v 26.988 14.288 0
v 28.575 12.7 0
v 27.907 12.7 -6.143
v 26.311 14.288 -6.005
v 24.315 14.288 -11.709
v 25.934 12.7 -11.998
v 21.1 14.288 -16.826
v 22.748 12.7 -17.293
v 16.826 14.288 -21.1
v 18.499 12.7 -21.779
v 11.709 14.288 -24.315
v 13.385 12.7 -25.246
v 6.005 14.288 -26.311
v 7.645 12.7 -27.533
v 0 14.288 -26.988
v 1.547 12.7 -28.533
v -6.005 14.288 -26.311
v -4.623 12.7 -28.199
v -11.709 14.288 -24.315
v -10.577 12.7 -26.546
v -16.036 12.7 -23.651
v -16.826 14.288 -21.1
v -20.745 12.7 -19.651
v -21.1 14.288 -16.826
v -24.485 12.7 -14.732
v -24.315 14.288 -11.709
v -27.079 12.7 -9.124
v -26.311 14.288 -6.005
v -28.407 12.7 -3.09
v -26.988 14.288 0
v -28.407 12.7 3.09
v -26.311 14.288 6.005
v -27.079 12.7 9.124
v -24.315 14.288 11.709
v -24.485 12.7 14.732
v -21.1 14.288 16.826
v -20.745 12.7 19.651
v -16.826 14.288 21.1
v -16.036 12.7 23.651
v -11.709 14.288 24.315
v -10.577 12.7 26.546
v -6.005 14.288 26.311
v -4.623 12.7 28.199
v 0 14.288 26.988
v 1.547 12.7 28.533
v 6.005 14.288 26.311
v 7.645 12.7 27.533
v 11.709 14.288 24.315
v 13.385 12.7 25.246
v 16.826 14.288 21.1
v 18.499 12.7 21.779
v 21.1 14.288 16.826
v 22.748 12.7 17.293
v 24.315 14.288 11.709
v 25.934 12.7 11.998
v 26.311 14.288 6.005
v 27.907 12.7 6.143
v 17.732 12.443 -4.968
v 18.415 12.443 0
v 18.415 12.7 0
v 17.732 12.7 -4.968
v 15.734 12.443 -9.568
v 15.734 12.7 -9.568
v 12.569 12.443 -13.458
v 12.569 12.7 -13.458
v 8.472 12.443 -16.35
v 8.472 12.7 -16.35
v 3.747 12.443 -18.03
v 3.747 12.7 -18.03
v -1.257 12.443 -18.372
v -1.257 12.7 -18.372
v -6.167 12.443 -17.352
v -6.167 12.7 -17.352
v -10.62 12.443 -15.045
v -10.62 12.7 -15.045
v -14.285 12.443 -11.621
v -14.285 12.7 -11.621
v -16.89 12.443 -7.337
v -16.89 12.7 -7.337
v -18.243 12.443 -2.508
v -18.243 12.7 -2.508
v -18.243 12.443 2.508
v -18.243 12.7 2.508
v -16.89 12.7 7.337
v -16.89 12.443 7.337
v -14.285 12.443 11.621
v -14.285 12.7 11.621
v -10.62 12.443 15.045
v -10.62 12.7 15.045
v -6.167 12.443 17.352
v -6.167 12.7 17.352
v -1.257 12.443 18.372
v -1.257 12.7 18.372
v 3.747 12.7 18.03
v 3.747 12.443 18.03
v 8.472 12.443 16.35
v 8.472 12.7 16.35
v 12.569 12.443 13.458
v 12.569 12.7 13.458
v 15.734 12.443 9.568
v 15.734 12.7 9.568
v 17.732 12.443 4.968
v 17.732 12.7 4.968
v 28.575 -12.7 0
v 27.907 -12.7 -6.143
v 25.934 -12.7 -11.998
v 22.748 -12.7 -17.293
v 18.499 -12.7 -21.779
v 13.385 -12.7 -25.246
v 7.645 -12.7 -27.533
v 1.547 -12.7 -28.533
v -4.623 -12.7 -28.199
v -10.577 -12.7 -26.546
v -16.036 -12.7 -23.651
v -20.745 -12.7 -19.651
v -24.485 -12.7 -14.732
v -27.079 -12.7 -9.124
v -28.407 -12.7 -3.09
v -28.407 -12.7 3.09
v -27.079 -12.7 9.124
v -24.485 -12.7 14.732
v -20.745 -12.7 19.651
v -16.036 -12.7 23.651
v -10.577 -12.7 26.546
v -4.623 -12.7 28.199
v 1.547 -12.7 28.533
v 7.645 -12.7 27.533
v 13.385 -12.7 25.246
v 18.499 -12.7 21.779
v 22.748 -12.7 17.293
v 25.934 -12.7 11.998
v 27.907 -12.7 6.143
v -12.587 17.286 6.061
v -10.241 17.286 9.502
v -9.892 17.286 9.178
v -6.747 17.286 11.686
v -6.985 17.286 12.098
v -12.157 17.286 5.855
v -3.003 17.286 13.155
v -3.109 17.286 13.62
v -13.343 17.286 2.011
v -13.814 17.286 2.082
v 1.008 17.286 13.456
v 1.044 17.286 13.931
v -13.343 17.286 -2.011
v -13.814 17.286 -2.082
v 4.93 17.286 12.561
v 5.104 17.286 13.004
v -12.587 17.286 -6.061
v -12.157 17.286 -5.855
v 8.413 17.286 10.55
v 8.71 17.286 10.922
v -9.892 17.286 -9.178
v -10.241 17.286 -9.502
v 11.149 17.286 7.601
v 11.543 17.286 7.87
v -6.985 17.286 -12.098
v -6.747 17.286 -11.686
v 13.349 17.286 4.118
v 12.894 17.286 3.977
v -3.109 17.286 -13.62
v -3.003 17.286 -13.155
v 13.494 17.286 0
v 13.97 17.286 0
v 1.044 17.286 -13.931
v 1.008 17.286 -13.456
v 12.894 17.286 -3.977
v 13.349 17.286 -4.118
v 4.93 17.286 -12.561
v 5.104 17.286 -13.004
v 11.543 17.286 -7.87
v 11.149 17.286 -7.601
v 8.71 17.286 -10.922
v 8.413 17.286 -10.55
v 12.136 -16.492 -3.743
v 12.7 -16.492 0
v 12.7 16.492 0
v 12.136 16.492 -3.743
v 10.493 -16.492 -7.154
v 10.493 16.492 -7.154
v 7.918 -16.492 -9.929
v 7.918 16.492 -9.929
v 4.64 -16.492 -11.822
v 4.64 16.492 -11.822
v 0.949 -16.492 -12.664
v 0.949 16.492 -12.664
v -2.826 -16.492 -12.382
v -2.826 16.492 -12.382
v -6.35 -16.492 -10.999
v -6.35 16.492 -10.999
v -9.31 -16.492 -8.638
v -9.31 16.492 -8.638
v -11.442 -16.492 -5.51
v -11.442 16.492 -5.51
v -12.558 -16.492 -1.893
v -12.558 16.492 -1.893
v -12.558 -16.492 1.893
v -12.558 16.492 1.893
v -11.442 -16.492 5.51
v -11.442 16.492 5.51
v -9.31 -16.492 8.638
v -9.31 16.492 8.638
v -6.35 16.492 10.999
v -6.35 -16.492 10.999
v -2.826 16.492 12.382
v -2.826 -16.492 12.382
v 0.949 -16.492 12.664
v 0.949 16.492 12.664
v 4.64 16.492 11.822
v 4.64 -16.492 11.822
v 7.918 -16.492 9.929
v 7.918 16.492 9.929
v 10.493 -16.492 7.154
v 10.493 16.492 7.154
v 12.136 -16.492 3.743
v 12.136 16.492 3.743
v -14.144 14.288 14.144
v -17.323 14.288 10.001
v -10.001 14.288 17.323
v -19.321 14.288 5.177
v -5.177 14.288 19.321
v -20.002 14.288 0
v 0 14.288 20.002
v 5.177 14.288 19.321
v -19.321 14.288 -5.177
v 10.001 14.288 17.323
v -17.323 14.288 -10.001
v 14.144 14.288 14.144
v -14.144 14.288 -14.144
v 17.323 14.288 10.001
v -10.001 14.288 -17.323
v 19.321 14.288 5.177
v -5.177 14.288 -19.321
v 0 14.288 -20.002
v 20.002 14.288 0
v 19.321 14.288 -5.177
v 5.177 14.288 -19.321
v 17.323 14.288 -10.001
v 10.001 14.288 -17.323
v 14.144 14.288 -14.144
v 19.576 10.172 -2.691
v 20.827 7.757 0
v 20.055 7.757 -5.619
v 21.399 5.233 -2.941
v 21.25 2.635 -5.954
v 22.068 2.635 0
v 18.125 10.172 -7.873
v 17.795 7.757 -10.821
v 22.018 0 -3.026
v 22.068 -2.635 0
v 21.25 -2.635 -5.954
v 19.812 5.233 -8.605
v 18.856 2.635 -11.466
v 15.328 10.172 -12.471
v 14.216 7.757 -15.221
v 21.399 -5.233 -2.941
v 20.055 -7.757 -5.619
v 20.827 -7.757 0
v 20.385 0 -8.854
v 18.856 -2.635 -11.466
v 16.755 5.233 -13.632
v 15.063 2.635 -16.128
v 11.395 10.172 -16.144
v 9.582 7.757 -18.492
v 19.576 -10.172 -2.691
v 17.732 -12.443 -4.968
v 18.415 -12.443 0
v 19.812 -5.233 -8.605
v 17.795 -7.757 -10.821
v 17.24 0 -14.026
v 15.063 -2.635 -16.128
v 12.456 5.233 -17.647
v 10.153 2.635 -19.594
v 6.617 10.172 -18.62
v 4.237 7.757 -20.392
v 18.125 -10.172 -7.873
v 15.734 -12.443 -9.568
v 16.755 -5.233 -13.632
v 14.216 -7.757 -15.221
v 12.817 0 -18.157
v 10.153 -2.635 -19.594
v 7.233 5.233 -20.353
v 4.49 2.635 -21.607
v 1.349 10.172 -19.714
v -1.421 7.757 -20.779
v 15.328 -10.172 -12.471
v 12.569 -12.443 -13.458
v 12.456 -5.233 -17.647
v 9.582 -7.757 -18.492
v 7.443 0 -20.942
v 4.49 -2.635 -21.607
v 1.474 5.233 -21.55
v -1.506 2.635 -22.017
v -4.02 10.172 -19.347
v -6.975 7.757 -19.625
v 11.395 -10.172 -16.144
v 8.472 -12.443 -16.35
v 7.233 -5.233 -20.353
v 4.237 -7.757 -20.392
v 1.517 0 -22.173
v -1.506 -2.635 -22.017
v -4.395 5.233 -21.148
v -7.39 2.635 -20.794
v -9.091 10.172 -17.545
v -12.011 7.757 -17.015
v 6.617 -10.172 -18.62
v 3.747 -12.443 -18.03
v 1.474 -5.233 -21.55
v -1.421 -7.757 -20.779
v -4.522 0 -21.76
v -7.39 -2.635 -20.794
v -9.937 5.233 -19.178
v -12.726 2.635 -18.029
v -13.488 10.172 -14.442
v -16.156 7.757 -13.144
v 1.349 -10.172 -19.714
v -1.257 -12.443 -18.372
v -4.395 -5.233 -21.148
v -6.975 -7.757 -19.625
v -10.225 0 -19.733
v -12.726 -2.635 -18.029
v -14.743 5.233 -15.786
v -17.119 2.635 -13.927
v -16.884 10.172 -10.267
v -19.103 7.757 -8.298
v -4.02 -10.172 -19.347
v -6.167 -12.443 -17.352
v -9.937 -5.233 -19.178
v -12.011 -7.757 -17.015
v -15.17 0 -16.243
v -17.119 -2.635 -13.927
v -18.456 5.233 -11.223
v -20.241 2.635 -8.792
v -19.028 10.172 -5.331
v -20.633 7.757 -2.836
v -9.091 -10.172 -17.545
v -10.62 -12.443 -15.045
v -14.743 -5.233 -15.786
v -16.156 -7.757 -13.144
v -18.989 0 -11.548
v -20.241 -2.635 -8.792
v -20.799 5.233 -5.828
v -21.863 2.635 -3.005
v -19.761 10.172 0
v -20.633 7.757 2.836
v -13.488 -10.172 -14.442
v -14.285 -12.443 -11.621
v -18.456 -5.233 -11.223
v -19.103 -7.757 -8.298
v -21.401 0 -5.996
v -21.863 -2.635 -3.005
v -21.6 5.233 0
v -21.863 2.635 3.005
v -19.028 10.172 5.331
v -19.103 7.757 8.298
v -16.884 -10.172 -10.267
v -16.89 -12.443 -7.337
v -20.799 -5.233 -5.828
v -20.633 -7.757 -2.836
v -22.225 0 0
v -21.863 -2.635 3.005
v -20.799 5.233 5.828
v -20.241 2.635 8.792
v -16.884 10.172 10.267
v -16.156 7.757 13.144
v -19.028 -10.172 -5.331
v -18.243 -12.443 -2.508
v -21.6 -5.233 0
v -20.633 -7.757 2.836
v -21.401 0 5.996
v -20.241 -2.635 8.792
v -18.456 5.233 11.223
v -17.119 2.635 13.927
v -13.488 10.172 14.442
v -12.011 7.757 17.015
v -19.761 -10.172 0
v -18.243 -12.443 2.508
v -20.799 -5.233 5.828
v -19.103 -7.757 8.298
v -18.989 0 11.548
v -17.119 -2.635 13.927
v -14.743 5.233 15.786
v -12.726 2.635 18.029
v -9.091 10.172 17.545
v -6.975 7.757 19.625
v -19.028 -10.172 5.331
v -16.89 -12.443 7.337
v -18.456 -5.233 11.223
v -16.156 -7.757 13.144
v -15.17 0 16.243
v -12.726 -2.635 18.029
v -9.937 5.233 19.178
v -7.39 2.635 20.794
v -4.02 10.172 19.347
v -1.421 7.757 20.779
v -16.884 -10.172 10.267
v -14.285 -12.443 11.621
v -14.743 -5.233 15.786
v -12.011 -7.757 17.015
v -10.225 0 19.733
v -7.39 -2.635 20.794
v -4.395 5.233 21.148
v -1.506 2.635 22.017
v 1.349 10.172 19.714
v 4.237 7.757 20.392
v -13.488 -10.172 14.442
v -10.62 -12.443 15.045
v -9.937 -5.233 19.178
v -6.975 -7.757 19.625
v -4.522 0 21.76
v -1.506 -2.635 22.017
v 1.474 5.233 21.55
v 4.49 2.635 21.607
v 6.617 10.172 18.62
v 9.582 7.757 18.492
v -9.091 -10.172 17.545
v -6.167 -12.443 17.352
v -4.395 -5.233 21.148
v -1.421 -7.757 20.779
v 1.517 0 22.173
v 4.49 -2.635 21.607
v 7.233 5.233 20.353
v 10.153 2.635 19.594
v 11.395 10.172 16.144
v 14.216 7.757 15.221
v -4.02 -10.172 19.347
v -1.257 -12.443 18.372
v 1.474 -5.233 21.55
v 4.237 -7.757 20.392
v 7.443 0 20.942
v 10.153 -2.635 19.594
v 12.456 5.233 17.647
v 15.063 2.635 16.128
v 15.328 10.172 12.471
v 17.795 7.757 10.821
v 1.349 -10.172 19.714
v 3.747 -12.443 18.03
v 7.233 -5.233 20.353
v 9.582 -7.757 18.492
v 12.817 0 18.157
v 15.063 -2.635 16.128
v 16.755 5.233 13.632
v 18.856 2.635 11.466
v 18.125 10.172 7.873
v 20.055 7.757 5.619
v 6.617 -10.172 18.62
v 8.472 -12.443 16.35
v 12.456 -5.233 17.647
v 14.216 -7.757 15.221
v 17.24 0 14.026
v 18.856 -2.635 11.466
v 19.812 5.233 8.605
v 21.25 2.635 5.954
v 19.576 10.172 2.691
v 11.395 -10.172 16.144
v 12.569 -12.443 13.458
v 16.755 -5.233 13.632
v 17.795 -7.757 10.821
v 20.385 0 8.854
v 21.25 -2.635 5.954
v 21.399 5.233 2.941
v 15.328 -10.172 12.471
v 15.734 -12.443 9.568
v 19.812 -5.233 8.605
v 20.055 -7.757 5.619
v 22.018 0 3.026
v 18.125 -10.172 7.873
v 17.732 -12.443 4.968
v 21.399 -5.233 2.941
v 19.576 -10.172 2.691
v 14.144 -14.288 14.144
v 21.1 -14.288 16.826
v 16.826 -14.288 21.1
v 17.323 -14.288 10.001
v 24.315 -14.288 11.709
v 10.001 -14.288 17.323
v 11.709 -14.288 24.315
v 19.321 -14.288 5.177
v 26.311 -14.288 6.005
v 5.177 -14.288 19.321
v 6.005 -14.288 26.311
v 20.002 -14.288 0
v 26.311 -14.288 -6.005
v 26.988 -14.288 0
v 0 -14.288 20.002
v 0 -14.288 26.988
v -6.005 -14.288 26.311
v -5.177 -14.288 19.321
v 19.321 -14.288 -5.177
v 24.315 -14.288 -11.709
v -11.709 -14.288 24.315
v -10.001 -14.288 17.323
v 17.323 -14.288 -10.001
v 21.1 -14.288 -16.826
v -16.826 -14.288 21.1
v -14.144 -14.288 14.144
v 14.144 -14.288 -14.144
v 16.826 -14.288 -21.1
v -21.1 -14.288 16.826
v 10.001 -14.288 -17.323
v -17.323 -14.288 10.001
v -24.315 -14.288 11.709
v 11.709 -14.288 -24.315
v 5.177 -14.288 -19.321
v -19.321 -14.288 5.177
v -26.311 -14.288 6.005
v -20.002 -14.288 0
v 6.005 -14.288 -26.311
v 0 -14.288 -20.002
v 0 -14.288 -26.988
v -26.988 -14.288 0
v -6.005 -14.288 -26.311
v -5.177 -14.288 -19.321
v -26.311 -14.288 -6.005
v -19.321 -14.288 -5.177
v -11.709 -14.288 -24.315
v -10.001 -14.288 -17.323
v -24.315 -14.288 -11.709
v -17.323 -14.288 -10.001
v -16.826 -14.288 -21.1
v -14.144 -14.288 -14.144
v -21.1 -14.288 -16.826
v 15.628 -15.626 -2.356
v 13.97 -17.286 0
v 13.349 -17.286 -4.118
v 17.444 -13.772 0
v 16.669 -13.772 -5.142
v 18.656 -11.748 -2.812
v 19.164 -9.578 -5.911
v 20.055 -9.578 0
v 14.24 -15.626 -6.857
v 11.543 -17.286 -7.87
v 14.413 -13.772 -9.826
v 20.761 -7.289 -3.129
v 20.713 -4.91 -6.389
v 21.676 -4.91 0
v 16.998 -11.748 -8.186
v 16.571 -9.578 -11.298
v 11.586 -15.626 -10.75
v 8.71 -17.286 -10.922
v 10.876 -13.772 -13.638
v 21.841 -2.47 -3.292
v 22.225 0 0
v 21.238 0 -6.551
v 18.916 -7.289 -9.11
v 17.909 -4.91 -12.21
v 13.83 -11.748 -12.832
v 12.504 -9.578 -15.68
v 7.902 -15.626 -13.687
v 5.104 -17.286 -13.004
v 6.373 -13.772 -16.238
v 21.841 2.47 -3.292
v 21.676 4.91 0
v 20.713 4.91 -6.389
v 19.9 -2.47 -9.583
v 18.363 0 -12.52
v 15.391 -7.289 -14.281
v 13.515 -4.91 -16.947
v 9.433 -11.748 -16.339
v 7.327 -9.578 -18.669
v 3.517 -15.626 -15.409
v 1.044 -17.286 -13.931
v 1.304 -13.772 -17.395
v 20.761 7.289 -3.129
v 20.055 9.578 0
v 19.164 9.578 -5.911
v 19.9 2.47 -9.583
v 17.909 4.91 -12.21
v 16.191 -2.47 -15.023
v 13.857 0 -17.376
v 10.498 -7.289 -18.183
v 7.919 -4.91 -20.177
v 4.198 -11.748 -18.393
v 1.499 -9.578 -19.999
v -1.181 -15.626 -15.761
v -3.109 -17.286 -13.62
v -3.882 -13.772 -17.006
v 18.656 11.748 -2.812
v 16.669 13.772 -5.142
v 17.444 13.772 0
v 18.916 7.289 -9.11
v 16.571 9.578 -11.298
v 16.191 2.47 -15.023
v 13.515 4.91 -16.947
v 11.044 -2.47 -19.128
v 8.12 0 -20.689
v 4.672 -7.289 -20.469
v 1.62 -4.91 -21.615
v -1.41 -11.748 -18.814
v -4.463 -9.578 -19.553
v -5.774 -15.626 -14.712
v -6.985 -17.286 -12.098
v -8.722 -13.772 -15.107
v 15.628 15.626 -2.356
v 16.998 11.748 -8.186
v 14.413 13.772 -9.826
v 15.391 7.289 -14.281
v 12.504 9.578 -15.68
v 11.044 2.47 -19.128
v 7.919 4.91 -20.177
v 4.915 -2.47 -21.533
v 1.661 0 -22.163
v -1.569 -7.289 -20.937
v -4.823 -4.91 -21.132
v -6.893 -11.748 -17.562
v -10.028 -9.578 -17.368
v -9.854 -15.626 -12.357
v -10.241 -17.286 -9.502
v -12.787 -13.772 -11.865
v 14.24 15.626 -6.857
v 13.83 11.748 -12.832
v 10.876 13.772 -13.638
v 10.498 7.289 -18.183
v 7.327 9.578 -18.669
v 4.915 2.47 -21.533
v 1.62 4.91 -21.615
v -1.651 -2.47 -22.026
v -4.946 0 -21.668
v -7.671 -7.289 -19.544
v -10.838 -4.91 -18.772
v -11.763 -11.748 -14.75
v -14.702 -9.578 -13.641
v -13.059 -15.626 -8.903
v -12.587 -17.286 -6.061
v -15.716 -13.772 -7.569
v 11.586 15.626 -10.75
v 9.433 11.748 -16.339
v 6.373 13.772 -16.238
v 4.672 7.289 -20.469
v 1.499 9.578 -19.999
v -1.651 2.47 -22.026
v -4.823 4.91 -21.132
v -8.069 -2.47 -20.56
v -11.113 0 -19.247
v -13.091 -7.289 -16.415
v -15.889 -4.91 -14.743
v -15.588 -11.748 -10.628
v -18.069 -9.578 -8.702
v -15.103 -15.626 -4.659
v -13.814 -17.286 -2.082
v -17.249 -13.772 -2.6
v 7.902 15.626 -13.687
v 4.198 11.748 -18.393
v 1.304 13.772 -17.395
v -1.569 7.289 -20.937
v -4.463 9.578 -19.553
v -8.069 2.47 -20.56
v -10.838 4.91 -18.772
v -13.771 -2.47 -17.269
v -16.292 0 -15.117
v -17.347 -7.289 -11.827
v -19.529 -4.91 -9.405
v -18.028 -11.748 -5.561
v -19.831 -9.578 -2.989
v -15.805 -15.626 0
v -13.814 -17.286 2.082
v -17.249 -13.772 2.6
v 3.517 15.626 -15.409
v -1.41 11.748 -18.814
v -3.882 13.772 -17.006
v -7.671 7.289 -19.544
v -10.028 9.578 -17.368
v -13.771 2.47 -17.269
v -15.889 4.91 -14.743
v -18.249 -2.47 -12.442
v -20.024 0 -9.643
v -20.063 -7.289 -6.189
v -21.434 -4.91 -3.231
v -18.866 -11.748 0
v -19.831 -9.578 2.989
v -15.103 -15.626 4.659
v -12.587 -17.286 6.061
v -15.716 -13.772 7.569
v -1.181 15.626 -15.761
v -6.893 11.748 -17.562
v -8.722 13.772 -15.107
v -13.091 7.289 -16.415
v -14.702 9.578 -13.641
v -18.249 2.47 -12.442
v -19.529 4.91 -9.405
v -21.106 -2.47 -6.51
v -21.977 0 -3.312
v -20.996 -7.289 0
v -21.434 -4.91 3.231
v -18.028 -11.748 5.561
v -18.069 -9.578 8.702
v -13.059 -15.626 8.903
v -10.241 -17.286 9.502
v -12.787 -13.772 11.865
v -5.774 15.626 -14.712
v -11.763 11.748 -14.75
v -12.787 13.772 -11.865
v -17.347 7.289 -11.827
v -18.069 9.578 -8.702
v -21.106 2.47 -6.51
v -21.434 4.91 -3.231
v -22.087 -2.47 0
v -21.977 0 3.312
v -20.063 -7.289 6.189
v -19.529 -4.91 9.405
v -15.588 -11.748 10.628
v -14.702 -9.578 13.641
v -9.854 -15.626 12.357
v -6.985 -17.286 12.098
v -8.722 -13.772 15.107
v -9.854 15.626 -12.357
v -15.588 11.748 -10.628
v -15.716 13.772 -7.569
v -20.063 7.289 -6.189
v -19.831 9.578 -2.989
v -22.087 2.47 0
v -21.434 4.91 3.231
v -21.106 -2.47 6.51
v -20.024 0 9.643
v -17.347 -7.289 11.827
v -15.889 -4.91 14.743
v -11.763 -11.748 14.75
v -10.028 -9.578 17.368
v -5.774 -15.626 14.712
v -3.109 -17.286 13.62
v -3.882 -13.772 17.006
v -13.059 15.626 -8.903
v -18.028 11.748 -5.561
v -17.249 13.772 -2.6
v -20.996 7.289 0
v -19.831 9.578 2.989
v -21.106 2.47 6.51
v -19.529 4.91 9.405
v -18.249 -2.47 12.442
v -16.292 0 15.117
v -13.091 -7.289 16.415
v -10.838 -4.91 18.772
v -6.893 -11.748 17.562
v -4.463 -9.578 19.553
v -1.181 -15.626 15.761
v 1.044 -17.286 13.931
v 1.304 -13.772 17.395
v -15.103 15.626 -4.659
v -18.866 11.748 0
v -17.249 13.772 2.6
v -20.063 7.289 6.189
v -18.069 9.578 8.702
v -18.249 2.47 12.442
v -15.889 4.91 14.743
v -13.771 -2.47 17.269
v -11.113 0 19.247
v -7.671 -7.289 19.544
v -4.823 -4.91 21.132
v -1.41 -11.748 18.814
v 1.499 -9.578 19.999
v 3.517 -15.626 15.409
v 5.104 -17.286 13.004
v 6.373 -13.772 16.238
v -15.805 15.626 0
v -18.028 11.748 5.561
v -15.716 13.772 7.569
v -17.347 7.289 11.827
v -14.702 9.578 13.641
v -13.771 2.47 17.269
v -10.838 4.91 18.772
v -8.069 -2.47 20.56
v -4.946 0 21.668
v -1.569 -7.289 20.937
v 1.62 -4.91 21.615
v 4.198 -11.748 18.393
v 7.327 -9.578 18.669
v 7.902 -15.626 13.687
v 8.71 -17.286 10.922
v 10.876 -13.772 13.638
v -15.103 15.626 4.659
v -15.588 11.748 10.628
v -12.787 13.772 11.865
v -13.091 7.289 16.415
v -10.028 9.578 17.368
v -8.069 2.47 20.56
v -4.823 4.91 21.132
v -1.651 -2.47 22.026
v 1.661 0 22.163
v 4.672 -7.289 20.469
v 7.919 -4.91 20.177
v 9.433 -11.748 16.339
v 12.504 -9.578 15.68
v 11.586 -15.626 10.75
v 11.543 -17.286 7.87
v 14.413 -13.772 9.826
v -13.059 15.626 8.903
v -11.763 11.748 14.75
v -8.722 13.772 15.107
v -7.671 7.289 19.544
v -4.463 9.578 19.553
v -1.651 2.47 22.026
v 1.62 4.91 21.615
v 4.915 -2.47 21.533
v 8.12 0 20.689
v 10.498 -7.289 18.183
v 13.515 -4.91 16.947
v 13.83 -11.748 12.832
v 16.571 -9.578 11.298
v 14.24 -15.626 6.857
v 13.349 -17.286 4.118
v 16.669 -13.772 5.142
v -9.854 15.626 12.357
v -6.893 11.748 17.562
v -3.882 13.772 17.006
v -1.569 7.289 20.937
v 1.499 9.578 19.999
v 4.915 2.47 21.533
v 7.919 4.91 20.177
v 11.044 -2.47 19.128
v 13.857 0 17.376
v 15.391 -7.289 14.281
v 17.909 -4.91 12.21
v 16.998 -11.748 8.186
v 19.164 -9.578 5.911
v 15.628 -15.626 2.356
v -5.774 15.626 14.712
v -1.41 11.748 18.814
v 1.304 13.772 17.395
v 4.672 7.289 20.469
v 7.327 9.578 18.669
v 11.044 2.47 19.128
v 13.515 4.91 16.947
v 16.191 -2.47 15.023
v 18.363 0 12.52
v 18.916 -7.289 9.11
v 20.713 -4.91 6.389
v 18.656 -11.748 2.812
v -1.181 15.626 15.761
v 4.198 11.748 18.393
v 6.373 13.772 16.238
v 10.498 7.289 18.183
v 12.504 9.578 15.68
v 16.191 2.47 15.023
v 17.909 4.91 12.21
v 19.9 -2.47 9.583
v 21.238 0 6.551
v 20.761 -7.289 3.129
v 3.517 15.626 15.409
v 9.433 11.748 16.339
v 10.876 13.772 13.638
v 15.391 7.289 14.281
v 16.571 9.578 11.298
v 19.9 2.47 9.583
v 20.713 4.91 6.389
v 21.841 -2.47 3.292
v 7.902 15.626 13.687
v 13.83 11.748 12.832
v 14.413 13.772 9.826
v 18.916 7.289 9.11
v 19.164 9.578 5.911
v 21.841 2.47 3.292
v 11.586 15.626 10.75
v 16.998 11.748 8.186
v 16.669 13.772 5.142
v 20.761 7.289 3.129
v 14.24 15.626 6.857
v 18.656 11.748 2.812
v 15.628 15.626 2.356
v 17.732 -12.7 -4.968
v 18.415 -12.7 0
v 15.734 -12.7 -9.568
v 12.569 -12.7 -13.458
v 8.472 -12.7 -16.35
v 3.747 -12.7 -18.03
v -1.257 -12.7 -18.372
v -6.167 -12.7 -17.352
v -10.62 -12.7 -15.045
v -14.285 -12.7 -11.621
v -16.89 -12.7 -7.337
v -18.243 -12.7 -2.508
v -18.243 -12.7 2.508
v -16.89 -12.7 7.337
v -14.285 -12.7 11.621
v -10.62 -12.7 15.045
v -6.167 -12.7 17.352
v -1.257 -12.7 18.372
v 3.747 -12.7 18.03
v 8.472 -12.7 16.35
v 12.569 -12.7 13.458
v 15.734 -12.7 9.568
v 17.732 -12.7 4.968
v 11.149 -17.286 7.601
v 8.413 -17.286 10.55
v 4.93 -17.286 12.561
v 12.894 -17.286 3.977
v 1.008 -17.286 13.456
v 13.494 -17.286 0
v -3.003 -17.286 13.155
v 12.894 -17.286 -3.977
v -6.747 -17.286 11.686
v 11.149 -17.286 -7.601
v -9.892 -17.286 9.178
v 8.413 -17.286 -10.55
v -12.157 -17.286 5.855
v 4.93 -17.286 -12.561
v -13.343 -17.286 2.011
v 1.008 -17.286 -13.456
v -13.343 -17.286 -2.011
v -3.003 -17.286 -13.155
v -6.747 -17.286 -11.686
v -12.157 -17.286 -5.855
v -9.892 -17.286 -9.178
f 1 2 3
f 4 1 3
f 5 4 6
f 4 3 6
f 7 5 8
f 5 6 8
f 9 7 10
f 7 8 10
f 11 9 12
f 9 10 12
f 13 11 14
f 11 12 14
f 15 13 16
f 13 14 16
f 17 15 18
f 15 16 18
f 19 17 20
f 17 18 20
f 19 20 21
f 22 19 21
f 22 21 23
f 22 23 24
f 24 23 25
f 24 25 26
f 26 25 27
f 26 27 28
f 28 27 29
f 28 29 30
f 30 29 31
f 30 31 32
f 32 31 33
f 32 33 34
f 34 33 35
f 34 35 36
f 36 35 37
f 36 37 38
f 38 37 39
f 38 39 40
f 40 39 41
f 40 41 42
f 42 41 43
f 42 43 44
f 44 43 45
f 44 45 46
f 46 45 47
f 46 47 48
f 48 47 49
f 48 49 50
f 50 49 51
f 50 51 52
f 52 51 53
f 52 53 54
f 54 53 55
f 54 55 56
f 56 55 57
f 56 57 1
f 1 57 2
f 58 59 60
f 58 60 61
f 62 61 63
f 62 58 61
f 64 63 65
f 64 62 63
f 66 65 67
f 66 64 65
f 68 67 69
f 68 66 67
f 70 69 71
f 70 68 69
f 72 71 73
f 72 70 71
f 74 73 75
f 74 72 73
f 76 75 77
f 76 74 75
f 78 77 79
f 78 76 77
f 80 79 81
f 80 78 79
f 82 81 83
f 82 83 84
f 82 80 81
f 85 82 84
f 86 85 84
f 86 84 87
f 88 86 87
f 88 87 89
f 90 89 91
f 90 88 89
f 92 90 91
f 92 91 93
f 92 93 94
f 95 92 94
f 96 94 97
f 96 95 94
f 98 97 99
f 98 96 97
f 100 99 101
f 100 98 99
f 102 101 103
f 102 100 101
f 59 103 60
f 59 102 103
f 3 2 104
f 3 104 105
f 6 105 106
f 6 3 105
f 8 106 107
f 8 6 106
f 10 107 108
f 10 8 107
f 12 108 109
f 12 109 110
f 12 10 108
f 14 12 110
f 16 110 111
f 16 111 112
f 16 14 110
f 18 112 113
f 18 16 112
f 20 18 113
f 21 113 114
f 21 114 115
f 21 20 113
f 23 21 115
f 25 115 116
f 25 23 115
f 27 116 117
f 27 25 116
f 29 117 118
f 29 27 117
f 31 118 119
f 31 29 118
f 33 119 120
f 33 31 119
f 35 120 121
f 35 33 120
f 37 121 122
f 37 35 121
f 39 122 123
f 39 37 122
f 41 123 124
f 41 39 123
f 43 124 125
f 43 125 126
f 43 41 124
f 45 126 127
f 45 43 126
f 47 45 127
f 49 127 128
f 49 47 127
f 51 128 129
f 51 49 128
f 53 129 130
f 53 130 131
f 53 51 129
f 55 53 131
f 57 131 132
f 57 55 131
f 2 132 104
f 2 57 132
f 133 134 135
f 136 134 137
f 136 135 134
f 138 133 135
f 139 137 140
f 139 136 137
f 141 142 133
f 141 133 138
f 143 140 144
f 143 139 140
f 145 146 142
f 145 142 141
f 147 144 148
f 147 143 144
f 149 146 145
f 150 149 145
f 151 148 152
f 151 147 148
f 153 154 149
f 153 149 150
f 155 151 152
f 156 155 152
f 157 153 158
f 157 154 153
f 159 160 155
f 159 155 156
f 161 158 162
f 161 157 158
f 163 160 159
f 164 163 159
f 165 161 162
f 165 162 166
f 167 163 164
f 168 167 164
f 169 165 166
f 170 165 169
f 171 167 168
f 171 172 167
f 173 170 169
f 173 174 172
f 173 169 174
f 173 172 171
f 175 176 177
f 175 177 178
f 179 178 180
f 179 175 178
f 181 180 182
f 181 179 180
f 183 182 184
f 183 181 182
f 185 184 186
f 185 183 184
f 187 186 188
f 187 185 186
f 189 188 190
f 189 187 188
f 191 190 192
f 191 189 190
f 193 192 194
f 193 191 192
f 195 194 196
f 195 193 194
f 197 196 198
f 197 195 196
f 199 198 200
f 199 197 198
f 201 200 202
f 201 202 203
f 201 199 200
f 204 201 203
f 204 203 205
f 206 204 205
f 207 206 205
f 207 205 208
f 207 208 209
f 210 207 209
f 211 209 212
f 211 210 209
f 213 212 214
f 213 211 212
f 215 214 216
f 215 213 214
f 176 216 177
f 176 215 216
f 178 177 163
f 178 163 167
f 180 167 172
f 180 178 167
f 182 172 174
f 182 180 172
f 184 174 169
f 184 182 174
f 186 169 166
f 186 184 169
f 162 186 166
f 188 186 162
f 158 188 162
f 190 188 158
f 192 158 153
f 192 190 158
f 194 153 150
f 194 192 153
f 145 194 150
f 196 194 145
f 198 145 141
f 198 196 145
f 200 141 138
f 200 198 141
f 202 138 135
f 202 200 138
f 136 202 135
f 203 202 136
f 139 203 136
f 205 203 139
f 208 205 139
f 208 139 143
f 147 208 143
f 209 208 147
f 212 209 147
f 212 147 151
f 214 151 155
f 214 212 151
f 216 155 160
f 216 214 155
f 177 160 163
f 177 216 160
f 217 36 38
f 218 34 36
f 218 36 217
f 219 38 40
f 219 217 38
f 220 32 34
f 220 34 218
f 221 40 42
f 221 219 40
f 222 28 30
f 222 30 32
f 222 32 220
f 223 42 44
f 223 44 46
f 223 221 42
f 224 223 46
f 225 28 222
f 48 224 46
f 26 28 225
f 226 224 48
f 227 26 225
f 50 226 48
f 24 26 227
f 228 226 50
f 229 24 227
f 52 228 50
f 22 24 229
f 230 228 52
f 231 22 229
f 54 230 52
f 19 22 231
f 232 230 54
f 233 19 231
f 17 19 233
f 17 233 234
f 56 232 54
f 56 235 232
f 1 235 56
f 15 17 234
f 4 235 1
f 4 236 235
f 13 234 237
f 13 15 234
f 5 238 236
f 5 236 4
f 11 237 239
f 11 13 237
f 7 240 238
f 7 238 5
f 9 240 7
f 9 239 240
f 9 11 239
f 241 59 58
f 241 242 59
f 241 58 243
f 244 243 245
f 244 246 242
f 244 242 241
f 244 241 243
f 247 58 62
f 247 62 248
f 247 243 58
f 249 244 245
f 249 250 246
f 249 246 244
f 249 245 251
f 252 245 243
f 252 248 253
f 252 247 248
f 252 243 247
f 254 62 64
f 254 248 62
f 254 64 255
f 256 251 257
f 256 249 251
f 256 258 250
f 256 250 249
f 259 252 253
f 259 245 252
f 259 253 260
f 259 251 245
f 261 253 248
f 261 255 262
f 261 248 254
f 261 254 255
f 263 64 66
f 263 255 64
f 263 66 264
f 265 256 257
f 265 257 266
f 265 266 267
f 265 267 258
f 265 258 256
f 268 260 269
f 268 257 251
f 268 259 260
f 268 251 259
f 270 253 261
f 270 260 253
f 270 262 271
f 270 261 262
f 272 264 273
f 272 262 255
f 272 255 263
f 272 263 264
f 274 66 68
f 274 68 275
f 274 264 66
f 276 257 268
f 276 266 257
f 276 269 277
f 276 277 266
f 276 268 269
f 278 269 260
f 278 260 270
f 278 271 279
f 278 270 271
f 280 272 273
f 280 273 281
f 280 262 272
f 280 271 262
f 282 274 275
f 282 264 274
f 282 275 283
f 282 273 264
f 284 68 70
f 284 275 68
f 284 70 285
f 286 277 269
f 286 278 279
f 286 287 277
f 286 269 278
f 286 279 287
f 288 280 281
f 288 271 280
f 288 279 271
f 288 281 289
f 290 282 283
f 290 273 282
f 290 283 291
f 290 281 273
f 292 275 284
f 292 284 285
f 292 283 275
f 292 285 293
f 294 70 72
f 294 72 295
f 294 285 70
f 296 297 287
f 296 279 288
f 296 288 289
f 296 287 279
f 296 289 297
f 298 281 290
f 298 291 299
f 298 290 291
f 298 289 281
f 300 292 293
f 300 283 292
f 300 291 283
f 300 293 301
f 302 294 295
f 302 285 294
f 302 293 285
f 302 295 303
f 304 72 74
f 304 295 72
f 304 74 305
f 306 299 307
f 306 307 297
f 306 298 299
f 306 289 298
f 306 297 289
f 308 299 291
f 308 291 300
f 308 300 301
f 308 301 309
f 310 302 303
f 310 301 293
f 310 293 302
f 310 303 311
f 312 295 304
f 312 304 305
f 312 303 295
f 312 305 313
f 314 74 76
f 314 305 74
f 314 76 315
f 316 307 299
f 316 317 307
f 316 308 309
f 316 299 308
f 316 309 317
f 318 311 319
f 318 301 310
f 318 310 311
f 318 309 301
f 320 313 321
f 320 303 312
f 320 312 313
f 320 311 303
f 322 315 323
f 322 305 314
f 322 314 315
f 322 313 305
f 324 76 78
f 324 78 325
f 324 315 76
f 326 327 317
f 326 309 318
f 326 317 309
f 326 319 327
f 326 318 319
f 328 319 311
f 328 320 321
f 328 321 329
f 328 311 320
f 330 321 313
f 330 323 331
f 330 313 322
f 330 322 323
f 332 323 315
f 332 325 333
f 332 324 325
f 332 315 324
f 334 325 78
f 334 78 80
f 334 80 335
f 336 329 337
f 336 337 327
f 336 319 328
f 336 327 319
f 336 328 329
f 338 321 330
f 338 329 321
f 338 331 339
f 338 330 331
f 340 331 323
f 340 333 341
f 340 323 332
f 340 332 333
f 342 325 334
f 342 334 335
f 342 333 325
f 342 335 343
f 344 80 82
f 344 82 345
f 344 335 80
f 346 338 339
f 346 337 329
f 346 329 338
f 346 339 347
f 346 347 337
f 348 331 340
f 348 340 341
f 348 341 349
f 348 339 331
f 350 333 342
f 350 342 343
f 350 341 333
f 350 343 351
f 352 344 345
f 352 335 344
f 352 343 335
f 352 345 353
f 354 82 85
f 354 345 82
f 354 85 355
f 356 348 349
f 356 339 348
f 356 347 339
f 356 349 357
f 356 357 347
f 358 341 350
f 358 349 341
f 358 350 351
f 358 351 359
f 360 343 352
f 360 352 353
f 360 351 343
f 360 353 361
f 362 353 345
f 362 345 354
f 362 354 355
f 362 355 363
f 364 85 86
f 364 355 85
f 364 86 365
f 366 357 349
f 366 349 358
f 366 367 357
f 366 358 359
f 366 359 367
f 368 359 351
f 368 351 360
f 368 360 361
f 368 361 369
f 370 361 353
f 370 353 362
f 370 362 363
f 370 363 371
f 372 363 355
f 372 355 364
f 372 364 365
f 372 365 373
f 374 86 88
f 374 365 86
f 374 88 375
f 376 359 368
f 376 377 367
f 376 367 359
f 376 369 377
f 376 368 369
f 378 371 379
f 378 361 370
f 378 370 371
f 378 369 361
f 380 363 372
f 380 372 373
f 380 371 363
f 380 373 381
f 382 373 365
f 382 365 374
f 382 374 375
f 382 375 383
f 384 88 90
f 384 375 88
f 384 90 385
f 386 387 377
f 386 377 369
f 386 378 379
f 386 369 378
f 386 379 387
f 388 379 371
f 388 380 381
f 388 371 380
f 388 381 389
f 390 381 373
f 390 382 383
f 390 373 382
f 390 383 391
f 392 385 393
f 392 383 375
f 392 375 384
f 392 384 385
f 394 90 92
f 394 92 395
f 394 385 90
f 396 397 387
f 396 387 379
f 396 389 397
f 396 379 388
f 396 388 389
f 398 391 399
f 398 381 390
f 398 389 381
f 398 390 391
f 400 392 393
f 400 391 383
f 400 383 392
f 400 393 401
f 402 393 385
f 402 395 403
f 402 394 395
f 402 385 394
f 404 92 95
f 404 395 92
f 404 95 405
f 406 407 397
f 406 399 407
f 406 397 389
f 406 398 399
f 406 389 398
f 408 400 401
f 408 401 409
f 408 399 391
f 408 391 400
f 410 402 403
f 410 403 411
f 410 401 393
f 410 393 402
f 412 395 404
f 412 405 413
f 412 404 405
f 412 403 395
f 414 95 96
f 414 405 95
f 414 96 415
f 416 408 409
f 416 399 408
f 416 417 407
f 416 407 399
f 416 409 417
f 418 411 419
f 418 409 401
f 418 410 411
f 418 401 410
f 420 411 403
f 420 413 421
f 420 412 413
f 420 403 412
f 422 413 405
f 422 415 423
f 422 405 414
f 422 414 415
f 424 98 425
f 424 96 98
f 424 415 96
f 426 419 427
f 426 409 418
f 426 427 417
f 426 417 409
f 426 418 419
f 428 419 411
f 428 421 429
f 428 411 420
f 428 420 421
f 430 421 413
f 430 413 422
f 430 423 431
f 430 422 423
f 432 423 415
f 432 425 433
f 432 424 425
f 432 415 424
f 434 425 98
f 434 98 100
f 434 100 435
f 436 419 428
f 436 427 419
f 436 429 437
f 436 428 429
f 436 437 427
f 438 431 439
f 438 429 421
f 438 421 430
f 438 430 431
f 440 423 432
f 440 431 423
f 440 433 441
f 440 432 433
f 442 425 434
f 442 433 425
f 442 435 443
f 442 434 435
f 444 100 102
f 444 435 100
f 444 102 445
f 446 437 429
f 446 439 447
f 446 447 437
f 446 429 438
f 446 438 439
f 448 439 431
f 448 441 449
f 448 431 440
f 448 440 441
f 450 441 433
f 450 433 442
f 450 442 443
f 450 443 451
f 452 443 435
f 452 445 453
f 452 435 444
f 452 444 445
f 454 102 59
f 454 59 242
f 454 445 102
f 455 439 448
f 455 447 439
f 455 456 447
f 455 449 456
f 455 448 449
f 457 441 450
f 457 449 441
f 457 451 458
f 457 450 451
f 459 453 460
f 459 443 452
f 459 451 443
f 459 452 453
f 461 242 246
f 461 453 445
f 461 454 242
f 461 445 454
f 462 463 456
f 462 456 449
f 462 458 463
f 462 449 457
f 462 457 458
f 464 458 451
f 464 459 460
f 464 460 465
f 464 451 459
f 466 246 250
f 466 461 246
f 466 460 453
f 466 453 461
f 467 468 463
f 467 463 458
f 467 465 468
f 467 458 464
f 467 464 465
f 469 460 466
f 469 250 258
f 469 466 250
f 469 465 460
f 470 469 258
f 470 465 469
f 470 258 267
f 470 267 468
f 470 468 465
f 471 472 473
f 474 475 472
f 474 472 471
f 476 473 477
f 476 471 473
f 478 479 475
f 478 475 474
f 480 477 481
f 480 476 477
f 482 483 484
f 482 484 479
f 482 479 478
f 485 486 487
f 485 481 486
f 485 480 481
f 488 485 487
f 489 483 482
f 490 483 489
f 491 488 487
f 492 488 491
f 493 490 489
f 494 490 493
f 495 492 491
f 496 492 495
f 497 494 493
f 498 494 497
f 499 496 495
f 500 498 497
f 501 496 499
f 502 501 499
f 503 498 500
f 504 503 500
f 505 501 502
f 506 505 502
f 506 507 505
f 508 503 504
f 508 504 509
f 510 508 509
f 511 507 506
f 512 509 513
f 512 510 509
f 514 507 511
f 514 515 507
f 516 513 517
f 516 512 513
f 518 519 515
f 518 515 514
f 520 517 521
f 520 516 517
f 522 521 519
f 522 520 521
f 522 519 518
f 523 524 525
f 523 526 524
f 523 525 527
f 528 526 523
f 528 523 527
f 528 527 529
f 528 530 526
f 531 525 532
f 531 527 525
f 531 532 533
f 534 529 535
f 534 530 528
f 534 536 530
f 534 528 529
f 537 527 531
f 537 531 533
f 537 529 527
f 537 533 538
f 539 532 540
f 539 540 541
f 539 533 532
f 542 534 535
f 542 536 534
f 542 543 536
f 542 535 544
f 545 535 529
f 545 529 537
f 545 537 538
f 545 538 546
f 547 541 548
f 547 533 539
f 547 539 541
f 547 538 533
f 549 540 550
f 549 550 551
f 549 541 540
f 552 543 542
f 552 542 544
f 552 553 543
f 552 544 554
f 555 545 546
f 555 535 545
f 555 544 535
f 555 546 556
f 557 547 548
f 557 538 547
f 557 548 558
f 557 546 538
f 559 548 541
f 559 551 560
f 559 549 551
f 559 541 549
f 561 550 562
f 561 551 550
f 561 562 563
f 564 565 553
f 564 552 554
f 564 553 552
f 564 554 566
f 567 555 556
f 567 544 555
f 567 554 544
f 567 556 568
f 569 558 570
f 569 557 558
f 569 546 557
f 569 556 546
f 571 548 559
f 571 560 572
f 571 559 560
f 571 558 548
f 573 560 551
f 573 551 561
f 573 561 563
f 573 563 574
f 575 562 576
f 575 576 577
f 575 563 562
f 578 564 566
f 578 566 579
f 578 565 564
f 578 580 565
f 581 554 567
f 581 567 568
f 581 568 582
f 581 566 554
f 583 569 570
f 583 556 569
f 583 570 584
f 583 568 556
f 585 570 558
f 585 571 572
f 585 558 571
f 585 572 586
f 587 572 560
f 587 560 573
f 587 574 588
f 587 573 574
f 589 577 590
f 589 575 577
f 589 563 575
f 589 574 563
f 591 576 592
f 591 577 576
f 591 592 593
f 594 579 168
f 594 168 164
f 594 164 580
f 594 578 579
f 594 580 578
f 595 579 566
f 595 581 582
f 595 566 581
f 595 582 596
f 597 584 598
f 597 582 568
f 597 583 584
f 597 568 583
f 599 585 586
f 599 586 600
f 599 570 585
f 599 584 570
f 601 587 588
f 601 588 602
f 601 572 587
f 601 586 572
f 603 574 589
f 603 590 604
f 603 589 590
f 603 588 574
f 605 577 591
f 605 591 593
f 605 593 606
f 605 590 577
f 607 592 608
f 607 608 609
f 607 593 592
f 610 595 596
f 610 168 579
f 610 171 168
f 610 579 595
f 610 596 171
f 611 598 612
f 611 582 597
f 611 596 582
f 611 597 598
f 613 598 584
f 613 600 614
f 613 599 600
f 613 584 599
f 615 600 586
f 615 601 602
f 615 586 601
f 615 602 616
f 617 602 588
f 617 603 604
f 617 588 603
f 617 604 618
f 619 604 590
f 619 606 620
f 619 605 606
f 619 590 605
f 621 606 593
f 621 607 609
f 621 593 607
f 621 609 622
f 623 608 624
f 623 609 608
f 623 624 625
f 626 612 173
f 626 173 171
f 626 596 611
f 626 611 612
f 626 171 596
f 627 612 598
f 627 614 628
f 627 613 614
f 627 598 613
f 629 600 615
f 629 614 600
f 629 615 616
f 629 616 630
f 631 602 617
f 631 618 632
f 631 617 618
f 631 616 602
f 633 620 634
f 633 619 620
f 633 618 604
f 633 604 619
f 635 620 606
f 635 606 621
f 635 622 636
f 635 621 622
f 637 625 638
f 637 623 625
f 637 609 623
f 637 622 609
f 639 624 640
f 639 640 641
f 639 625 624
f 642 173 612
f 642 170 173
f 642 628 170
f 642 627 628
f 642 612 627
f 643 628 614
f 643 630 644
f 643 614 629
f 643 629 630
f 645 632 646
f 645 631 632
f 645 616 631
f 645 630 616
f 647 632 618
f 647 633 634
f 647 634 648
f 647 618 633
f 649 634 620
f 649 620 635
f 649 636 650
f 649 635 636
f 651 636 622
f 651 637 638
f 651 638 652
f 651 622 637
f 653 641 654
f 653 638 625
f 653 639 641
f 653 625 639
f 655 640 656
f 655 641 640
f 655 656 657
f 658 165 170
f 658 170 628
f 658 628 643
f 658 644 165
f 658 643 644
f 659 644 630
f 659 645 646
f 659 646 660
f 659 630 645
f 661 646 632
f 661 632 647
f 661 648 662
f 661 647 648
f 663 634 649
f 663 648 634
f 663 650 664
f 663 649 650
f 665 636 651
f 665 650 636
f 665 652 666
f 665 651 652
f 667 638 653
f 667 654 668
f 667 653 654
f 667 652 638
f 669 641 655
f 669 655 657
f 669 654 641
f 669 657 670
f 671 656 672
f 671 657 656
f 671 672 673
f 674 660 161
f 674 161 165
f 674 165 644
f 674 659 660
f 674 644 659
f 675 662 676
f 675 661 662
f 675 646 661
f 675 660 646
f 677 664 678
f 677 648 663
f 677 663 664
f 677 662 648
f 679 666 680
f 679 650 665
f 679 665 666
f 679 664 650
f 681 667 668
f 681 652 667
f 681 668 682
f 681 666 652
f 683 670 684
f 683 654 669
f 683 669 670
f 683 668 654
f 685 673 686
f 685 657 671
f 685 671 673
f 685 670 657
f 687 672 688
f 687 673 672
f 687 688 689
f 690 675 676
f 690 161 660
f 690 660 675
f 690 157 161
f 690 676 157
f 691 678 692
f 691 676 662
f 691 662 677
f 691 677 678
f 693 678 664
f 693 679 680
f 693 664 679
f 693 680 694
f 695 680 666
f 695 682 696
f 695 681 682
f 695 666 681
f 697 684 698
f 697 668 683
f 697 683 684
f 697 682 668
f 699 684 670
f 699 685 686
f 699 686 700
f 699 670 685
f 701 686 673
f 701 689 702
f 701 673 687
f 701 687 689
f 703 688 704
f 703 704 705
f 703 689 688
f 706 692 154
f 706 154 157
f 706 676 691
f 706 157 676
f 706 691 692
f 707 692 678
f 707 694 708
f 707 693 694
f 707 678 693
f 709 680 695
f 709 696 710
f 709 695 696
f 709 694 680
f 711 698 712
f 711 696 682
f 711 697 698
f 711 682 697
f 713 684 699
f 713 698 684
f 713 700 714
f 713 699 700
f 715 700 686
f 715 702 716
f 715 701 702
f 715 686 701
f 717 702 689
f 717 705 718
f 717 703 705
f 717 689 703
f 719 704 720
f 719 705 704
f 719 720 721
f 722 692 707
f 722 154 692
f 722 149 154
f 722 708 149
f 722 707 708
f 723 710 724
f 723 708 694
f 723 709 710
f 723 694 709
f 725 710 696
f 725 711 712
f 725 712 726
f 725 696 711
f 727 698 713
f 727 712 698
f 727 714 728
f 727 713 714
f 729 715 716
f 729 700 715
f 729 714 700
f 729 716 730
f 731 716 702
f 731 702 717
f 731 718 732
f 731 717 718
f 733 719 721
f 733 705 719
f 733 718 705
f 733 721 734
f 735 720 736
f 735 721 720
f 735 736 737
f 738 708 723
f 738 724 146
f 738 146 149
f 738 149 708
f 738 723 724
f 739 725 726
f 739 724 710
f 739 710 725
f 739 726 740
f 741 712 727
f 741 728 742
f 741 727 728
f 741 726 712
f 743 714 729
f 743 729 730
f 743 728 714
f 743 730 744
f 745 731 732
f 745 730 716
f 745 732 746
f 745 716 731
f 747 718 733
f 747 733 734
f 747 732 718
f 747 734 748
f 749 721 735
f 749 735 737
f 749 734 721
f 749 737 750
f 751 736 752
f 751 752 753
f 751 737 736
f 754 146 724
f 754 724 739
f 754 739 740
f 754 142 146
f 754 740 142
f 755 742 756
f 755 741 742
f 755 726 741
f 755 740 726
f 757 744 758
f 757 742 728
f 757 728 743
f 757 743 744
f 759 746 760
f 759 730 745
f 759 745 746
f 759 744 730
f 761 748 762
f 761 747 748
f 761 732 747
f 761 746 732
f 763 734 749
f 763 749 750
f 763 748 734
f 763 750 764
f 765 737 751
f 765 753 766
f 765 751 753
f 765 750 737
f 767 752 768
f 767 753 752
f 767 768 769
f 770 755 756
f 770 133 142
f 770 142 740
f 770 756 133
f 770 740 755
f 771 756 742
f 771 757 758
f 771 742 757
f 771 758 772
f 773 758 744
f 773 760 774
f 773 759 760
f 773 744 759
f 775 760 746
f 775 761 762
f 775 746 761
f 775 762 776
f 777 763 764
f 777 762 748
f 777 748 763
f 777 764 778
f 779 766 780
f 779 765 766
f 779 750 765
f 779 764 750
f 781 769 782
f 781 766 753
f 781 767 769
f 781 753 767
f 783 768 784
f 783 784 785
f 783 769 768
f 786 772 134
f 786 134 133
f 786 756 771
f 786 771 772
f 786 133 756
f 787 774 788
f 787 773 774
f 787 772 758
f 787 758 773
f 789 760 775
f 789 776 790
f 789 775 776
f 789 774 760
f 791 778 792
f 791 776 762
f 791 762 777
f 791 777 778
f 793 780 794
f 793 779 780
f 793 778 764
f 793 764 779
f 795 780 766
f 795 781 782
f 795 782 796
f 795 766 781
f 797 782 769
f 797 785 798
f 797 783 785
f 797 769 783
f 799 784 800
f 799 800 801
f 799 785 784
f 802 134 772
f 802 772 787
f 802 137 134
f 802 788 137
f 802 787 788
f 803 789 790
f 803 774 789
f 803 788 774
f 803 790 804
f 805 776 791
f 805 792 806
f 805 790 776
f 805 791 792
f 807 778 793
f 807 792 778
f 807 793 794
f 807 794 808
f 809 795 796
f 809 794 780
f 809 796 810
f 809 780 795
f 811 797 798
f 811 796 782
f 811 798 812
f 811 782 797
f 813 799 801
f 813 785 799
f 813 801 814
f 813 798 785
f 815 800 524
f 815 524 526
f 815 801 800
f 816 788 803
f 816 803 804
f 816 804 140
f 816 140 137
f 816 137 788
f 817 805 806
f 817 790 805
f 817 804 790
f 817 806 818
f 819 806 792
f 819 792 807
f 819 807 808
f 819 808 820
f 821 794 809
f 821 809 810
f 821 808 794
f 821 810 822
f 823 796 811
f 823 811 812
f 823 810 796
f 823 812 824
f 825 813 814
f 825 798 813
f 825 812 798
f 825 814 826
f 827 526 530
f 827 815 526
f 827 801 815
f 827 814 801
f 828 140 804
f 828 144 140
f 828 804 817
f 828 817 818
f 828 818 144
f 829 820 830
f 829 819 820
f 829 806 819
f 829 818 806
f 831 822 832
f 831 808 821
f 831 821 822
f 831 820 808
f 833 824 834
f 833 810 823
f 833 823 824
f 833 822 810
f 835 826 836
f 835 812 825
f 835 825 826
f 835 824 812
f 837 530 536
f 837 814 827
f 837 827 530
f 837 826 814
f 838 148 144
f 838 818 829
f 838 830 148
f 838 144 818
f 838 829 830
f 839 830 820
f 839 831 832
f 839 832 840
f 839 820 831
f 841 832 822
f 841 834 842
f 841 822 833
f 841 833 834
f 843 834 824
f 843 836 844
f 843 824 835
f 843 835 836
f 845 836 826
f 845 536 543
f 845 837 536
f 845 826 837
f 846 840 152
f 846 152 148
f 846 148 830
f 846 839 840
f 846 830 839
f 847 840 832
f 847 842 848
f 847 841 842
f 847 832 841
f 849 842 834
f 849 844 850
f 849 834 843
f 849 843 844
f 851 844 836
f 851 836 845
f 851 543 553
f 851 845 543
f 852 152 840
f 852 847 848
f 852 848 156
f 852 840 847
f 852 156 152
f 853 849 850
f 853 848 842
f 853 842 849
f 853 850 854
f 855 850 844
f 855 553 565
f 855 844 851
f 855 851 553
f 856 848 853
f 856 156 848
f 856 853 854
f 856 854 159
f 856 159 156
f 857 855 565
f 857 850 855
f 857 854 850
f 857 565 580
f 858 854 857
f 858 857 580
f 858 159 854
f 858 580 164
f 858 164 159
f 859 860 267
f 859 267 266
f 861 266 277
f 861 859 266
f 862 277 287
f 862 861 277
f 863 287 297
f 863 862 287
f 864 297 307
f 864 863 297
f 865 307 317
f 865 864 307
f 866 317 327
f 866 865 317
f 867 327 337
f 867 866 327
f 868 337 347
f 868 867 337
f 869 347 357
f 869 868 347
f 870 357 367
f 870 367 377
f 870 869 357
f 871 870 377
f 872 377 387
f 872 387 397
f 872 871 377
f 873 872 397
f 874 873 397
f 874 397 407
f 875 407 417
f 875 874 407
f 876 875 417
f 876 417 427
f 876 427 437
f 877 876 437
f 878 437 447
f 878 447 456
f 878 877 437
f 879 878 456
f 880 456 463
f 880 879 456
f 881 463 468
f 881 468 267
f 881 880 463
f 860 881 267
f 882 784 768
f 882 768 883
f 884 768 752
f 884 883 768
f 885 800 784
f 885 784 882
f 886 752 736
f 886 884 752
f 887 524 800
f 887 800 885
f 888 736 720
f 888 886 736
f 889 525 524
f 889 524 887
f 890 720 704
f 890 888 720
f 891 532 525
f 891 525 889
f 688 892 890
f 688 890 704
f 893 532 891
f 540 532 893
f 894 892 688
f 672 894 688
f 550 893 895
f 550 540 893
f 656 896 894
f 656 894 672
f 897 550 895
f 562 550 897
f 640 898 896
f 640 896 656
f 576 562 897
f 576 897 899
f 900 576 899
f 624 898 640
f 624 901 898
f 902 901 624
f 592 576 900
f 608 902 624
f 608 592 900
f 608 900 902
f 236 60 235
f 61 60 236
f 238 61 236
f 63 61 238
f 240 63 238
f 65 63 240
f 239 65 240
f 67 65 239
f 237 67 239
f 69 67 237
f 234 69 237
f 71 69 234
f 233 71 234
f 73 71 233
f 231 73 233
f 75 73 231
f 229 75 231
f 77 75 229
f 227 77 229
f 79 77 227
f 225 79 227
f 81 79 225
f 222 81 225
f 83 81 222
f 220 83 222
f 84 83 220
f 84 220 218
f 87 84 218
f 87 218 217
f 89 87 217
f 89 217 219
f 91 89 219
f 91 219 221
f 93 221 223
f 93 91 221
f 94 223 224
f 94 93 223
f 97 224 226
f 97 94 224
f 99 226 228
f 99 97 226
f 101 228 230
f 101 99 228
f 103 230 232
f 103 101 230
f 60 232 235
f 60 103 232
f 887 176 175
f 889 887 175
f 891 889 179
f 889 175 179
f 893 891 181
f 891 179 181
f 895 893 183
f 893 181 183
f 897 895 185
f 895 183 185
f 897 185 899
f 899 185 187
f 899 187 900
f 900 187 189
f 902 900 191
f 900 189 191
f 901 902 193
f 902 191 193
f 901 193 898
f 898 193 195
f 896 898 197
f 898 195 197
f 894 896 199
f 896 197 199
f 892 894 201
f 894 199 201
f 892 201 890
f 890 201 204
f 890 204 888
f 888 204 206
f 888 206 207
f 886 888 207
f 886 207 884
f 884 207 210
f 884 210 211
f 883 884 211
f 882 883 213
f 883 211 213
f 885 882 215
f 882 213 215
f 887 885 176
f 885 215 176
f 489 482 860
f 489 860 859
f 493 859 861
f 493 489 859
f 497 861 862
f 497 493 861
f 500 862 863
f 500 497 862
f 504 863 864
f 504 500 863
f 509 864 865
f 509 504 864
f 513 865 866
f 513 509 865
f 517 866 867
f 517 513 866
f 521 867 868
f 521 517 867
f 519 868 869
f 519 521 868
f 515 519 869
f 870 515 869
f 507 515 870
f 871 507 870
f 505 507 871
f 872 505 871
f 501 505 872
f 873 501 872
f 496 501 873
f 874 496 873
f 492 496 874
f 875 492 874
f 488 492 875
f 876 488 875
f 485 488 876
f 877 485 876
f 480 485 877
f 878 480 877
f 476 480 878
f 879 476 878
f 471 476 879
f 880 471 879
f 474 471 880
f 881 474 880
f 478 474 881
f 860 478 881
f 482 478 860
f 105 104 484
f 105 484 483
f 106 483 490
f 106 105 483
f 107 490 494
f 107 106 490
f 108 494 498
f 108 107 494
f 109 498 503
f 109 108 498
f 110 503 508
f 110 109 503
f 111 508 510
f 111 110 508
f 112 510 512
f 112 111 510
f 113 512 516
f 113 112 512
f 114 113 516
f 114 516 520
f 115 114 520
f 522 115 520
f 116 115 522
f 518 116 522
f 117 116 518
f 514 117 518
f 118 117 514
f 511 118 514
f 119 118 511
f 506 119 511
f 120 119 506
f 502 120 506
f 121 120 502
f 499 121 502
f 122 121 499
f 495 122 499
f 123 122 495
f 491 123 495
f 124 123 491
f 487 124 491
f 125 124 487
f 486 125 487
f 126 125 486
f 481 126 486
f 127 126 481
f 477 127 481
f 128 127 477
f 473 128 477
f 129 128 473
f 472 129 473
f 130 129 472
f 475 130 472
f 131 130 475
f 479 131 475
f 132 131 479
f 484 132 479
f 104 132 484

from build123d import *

# Parameters (mm, degrees)
F5_SIZE = 1.5875
F6_SIZE = 0.79375
F7_SIZE = 1.5875


with BuildPart() as f2:
    # F0 (on Top) → F2 (revolve)
    with BuildSketch(Plane.XY):
        with BuildLine():
            Line((12.7, -17.285535), (13.97, -17.285535))
            ThreePointArc((13.97, -17.285535), (22.225, 0), (13.97, 17.285535))
            Line((13.97, 17.285535), (12.7, 17.285535))
            Line((12.7, 17.285535), (12.7, -17.285535))
        make_face()
    revolve(axis=Axis((0, 40.697299, 0), (0, 1, 0)))

    # F6
    f6_edges = [f2.edges().sort_by_distance(p)[0] for p in [
        (-12.7, 17.285535, 0),
        (-12.7, -17.285535, 0),
    ]]
    chamfer(f6_edges, length=F6_SIZE)


with BuildPart() as f4:
    # F3 (on Top) → F4 (revolve)
    with BuildSketch(Plane.XY):
        with BuildLine():
            Line((28.575, 14.2875), (18.415, 14.2875))
            Line((18.415, 14.2875), (18.415, 12.443408))
            ThreePointArc((18.415, 12.443408), (22.225, 0), (18.415, -12.443408))
            Line((18.415, -12.443408), (18.415, -14.2875))
            Line((18.415, -14.2875), (28.575, -14.2875))
            Line((28.575, -14.2875), (28.575, 14.2875))
        make_face()
    revolve(axis=Axis((0, 40.697299, 0), (0, 1, 0)))

    # F5
    f5_edges = [f4.edges().sort_by_distance(p)[0] for p in [
        (-28.575, 14.2875, 0),
        (-28.575, -14.2875, 0),
    ]]
    chamfer(f5_edges, length=F5_SIZE)

    # F7
    f7_edges = [f4.edges().sort_by_distance(p)[0] for p in [
        (-18.415, -14.2875, 0),
        (-18.415, 14.2875, 0),
    ]]
    chamfer(f7_edges, length=F7_SIZE)


solid = Compound([f2.part, f4.part])
